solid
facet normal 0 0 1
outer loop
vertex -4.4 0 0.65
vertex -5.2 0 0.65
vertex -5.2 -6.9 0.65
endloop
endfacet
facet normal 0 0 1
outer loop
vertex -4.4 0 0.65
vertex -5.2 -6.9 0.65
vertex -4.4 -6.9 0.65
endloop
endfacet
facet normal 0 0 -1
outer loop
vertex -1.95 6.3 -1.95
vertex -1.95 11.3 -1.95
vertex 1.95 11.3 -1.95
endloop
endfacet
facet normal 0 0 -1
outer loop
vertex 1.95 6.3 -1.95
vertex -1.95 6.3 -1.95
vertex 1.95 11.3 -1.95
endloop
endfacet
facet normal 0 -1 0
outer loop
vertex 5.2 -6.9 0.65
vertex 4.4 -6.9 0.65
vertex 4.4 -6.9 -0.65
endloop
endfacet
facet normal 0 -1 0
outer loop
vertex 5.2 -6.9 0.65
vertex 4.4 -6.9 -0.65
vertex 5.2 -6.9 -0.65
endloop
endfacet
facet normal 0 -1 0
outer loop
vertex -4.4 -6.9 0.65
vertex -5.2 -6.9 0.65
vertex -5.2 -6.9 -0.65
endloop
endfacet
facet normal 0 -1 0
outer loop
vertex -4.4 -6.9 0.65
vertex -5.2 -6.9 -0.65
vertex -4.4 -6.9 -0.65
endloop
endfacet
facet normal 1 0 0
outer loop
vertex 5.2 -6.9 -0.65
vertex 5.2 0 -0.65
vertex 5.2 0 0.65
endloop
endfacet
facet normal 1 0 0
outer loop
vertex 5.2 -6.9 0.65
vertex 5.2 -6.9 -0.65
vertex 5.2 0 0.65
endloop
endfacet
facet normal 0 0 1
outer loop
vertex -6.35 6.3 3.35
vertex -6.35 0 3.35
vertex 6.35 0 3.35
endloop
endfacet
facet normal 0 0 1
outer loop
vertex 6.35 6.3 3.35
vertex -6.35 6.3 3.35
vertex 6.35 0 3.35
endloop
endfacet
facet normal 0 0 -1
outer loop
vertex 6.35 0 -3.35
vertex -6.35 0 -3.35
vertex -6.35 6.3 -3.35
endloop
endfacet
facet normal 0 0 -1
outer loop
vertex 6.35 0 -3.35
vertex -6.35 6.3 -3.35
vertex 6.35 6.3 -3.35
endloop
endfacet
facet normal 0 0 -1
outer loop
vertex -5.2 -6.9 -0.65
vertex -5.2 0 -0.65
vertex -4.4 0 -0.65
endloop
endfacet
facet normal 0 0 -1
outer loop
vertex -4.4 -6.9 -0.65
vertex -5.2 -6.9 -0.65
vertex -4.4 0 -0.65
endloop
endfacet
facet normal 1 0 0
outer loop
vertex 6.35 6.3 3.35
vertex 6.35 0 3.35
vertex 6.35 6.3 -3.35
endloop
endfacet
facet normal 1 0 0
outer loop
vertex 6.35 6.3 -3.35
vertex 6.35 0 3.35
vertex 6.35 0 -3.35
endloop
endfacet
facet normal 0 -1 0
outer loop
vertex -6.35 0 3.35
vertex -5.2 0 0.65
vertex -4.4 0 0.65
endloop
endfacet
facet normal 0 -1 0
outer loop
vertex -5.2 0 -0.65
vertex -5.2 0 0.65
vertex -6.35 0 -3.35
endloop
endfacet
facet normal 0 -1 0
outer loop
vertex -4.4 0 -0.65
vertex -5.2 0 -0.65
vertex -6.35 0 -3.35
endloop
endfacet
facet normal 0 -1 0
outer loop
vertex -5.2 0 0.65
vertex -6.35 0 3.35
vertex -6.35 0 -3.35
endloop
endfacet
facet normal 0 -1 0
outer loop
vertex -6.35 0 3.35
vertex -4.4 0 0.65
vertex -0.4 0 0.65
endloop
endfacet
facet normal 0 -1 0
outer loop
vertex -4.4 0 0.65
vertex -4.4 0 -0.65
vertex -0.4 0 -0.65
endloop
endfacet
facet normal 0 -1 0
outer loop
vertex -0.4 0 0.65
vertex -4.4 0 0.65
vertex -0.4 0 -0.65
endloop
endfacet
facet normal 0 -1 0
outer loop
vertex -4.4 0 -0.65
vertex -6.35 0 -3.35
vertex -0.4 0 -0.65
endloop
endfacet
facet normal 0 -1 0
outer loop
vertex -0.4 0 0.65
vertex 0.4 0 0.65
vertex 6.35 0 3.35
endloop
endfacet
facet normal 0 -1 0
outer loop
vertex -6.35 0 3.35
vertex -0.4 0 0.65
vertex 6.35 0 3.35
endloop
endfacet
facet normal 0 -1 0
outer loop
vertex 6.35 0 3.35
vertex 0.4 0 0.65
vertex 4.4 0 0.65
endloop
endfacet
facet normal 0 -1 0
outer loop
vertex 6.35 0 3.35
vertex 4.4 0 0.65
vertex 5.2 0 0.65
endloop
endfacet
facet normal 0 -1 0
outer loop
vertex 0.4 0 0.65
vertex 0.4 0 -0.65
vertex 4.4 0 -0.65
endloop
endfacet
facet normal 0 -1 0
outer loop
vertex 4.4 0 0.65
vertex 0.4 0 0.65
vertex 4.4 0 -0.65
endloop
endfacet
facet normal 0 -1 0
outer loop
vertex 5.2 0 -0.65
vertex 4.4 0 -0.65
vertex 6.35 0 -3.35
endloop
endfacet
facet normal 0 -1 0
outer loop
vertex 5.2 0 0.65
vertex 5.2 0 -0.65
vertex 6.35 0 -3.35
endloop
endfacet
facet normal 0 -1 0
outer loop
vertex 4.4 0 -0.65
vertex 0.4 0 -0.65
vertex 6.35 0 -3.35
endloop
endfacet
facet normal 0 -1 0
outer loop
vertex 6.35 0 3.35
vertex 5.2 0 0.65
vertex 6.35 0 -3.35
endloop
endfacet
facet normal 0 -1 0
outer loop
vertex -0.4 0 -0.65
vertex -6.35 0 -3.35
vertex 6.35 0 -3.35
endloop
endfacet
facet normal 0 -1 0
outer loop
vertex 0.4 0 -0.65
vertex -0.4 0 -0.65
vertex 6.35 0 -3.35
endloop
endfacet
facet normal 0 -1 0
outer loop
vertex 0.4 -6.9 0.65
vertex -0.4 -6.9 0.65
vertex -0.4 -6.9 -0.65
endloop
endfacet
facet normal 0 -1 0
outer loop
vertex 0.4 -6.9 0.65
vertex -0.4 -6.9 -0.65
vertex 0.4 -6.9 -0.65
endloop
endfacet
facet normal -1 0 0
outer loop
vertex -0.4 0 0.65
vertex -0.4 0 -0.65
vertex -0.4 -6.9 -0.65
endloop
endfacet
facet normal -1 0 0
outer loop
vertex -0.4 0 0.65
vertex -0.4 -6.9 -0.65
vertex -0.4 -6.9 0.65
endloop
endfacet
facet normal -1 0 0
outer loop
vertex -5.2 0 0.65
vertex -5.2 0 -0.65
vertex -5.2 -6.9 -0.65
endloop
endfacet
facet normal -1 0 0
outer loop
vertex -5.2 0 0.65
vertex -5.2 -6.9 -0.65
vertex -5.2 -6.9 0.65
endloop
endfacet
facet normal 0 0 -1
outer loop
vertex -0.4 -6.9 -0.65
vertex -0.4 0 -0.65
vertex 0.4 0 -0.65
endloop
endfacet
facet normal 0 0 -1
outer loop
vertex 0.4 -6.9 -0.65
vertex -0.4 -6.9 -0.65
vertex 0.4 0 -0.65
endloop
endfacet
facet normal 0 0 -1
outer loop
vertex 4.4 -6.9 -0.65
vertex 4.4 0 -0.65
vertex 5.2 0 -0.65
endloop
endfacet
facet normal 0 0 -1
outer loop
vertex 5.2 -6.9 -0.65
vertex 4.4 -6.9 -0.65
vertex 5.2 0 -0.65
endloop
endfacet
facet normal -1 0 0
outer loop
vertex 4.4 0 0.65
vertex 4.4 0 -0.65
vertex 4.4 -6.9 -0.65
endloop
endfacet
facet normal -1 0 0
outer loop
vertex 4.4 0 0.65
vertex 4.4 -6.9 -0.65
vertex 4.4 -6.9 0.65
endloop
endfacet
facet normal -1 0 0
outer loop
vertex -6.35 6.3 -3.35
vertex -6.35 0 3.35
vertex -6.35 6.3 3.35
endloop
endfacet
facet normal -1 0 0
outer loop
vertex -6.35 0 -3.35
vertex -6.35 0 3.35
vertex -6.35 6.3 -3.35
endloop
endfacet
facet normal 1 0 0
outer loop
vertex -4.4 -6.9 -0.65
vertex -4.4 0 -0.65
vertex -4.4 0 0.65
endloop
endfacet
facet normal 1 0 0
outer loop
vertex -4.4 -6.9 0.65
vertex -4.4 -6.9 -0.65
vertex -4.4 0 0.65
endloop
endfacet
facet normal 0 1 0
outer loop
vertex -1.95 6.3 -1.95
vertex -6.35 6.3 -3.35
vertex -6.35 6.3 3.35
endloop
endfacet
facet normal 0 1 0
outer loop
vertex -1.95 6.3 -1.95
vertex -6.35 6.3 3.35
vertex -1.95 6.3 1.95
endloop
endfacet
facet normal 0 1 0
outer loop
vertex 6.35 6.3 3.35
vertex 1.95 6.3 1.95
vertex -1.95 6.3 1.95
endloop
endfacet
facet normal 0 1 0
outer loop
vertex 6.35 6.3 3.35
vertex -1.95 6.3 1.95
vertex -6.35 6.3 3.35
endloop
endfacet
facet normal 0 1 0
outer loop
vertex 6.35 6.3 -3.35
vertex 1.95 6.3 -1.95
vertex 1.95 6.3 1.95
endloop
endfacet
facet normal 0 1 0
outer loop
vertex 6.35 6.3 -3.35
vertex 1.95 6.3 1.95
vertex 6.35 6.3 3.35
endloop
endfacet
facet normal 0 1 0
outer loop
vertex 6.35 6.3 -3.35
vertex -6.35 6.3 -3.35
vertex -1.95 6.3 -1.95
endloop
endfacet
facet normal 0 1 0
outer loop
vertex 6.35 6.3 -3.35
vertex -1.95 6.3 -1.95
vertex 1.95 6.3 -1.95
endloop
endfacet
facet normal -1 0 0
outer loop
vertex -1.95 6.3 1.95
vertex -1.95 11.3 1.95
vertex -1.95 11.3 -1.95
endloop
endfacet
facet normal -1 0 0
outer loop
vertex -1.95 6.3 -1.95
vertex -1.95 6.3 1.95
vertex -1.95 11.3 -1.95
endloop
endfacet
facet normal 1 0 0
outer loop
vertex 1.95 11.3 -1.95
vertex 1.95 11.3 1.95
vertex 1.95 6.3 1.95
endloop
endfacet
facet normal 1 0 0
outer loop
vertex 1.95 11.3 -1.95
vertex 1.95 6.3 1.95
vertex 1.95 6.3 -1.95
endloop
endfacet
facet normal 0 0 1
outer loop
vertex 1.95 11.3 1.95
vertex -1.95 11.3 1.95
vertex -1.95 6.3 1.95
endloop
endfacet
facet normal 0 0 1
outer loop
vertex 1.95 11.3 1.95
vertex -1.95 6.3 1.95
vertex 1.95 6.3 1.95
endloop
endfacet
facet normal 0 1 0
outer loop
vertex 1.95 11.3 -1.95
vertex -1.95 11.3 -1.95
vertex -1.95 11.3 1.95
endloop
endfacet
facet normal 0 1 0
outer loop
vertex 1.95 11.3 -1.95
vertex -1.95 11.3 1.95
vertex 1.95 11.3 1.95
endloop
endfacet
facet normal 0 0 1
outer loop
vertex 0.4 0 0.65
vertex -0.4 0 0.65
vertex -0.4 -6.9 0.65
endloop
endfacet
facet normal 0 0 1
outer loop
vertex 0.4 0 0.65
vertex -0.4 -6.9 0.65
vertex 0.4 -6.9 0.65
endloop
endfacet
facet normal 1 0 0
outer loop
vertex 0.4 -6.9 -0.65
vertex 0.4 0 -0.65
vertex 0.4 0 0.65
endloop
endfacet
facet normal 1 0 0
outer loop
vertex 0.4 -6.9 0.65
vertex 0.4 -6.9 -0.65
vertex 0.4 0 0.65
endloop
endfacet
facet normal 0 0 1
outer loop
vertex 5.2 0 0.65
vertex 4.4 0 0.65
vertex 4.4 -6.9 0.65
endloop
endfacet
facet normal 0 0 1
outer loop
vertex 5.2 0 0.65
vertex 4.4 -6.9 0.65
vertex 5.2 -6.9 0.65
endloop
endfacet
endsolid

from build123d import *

# Parameters (mm, degrees)
SKETCH_1_W      = 12.7
SKETCH_1_H      = 6.7
EXTRUDE_1_DEPTH = 6.3
SKETCH_2_W      = 3.9
SKETCH_2_H      = 3.9
EXTRUDE_2_DEPTH = 5
SKETCH_3_W      = 0.8
SKETCH_3_H      = 1.3
EXTRUDE_3_DEPTH = 6.9


with BuildPart() as part:
    # 草图1 → 凸台-拉伸1 (new body)
    with BuildSketch(Plane(origin=(0, 0, 0), x_dir=(1, 0, 0), z_dir=(0, 1, 0))):
        Rectangle(SKETCH_1_W, SKETCH_1_H)
    extrude(amount=EXTRUDE_1_DEPTH)

    # 草图2 → 凸台-拉伸2 (add)
    with BuildSketch(Plane(origin=(0, 6.3, 0), x_dir=(1, 0, 0), z_dir=(0, 1, 0))):
        Rectangle(SKETCH_2_W, SKETCH_2_H)
    extrude(amount=EXTRUDE_2_DEPTH)

    # 草图3 → 凸台-拉伸3 (add)
    with BuildSketch(Plane.XZ):
        Rectangle(SKETCH_3_W, SKETCH_3_H)
        with Locations((4.8, 0)):
            Rectangle(SKETCH_3_W, SKETCH_3_H)
        with Locations((-4.8, 0)):
            Rectangle(SKETCH_3_W, SKETCH_3_H)
    extrude(amount=EXTRUDE_3_DEPTH)


solid = part.part
